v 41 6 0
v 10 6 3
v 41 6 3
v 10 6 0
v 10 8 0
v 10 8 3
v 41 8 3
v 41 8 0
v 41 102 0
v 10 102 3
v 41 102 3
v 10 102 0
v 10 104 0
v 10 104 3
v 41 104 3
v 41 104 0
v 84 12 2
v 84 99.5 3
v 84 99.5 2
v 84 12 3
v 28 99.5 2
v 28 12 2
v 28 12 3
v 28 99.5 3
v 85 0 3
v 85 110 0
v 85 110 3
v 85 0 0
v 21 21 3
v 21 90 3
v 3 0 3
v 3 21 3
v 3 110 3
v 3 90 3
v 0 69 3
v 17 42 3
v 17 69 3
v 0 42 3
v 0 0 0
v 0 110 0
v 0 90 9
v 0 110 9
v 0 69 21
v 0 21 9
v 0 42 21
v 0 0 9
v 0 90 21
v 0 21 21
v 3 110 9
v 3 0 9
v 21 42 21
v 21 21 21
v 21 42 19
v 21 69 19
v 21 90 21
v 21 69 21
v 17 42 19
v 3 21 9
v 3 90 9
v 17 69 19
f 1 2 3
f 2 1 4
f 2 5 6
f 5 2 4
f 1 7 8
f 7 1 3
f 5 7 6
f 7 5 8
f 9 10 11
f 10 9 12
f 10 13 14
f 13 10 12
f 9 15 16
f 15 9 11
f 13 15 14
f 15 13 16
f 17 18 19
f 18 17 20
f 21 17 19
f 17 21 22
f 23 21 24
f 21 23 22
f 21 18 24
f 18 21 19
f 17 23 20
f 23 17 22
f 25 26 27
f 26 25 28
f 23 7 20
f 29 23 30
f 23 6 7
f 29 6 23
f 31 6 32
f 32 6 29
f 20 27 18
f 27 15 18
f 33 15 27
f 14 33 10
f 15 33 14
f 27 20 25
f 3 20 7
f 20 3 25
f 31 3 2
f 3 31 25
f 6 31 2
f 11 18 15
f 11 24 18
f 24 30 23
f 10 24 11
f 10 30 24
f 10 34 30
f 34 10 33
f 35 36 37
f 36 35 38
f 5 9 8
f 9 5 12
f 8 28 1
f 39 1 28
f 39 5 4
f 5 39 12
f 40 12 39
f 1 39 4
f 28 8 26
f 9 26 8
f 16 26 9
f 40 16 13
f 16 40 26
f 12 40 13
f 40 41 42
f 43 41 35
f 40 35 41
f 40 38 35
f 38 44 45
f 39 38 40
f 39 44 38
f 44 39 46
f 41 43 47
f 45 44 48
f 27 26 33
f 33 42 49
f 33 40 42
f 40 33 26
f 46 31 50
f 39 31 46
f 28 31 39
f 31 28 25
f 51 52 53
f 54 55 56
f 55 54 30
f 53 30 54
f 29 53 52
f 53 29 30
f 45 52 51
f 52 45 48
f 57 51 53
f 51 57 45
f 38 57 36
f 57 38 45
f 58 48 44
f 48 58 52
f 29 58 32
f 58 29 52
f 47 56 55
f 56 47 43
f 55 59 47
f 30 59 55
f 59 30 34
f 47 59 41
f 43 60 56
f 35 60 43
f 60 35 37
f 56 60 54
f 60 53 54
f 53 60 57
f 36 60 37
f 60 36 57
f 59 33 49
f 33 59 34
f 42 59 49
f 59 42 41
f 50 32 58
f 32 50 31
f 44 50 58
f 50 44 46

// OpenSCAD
/*
difference() {

cube([85,110,5]);

union() {

	rotate([0,0,90])translate([6,-40,-1])cube([2,30,15]);
	rotate([0,0,90])translate([102,-40,-1])cube([2,30,15]);
	translate([25,24,4])cube([56,66,20]);
	translate([78,27,-1])cylinder (h = 6, r=1.5, center = true, $fn=100);
	translate([28,87,-1])cylinder (h = 6, r=1.5, center = true, $fn=100);
	translate([78,87,-1])cylinder (h = 6, r=1.5, center = true, $fn=100);
	translate([28,27,-1])cylinder (h = 6, r=1.5, center = true, $fn=100);

}}

translate([0,8,3])cube([24,94,15]);

*/



difference() {

//cube([85,110,2]);
cube([85,110,3]);

union() {

	rotate([0,0,90])translate([6,-41,-1])cube([2,31,15]);
	rotate([0,0,90])translate([102,-41,-1])cube([2,31,15]);
	
    translate([28,12,2])cube([56,87.5,2]);
    // translate([25,22,1])cube([56.5,68,20]);

	/*translate([78,27,-1])cylinder (h = 6, r=1.5, center = true, $fn=100);
	translate([28,87,-1])cylinder (h = 6, r=1.5, center = true, $fn=100);
	translate([78,87,-1])cylinder (h = 6, r=1.5, center = true, $fn=100);
	translate([28,27,-1])cylinder (h = 6, r=1.5, center = true, $fn=100);*/

}}


//RaspberryPi B
translate([0,21,2])cube([21,21,19]);
translate([0,69,2])cube([21,21,19]);
translate([17,42,2])cube([4,40,17]);


//Raspberry PI A+
/*translate([0,21,2])cube([21,21,13.5]);
translate([0,69,2])cube([21,21,13.5]);
translate([17,42,2])cube([4,40,11.5]);
translate([25,22,1])cube([56.5,68,20]);

*/
translate([0,88,2])cube([3,22,7]);
translate([0,0,2])cube([3,22,7]);
